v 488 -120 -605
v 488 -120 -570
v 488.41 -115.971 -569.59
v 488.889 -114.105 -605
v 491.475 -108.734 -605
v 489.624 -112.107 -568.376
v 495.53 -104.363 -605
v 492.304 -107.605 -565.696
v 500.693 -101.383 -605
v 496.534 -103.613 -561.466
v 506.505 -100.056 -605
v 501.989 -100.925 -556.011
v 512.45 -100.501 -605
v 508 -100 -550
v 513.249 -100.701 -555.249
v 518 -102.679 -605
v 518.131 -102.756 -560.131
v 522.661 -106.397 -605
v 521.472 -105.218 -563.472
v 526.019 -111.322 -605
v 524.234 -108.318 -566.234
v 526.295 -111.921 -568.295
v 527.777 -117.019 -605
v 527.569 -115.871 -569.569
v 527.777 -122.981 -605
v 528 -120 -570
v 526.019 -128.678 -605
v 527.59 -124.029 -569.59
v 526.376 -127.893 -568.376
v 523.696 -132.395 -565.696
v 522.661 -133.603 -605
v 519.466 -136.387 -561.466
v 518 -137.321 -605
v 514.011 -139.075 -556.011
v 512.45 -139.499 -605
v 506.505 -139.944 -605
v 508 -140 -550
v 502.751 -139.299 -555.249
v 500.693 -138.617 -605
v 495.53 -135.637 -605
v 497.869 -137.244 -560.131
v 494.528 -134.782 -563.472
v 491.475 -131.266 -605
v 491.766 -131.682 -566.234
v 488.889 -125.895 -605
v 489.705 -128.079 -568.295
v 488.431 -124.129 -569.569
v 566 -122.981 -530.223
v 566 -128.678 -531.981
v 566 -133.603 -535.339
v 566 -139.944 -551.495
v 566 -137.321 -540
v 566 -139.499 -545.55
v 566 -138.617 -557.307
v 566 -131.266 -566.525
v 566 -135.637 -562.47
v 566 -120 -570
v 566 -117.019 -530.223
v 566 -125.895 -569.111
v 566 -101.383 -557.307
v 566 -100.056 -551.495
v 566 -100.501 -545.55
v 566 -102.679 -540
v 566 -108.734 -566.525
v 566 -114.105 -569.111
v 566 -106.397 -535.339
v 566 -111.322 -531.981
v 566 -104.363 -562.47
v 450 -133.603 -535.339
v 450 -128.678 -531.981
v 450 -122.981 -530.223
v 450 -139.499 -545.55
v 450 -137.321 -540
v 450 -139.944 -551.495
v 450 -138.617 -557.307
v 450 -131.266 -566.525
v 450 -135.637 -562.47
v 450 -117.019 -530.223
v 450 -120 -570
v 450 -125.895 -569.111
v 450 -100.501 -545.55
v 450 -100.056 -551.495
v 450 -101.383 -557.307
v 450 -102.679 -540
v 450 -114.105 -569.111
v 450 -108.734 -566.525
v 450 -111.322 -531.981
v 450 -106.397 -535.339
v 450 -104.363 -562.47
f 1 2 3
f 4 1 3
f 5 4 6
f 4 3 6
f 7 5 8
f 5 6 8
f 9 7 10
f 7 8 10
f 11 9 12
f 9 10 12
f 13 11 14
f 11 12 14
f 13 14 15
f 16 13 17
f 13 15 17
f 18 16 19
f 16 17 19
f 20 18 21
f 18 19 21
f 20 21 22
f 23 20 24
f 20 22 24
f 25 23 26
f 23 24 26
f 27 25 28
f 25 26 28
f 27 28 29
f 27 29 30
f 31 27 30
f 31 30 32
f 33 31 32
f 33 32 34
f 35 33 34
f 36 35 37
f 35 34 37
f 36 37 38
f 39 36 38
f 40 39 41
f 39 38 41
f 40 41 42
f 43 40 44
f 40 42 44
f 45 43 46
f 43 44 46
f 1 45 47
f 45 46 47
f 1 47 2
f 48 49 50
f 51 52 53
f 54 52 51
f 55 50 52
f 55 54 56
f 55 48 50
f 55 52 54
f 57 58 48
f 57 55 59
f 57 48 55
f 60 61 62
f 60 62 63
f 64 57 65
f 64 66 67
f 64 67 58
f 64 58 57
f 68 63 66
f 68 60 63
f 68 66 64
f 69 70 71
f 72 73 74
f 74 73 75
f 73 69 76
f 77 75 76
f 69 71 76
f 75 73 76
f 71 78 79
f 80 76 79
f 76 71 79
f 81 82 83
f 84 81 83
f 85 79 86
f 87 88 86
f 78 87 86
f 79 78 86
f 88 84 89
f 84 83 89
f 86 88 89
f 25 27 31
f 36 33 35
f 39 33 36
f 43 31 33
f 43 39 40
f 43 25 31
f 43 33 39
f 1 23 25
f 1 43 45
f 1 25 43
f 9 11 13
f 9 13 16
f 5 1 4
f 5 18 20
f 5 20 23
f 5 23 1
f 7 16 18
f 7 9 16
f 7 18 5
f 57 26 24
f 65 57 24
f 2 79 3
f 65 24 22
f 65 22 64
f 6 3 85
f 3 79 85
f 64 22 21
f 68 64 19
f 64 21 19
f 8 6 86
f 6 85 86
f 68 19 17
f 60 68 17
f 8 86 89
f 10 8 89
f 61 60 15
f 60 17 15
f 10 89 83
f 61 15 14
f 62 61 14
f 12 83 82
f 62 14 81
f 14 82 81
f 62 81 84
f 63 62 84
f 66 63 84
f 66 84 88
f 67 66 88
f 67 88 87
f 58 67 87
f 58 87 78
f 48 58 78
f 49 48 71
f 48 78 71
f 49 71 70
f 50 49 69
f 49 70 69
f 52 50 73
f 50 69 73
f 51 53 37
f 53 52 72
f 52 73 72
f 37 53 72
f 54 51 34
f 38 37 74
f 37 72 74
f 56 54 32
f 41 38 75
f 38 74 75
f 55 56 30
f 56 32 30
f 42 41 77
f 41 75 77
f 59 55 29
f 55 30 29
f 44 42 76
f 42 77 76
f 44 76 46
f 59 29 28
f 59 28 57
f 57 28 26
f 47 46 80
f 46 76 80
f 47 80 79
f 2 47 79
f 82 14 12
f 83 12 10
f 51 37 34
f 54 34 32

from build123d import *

# Parameters (mm, degrees)
CYLINDER003_R          = 20
CYLINDER003_DEPTH      = 116
CYLINDER004_R          = 20
CYLINDER004_DEPTH      = 55
FUSION_PLACEMENT_ANGLE = 90


with BuildPart() as cylinder:
    # Cylinder003 → Cylinder003 (new body)
    with BuildSketch(Plane.XY):
        Circle(CYLINDER003_R)
    extrude(amount=CYLINDER003_DEPTH)


with BuildPart() as t_stuk:
    # Cylinder004 → Cylinder004 (new body)
    with BuildSketch(Plane(origin=(0, 0, 58), x_dir=(0, 0, -1), z_dir=(1, 0, 0))):
        Circle(CYLINDER004_R)
    extrude(amount=CYLINDER004_DEPTH)

    # Fusion: union Cylinder
    add(cylinder.part)


with BuildPart() as t_stuk_1:
    # Fusion placement: moved
    add(t_stuk.part.moved(Location((450, -120, -550))).rotate(Axis((450, -120, -550), (0, 1, 0)), FUSION_PLACEMENT_ANGLE))


solid = t_stuk_1.part
